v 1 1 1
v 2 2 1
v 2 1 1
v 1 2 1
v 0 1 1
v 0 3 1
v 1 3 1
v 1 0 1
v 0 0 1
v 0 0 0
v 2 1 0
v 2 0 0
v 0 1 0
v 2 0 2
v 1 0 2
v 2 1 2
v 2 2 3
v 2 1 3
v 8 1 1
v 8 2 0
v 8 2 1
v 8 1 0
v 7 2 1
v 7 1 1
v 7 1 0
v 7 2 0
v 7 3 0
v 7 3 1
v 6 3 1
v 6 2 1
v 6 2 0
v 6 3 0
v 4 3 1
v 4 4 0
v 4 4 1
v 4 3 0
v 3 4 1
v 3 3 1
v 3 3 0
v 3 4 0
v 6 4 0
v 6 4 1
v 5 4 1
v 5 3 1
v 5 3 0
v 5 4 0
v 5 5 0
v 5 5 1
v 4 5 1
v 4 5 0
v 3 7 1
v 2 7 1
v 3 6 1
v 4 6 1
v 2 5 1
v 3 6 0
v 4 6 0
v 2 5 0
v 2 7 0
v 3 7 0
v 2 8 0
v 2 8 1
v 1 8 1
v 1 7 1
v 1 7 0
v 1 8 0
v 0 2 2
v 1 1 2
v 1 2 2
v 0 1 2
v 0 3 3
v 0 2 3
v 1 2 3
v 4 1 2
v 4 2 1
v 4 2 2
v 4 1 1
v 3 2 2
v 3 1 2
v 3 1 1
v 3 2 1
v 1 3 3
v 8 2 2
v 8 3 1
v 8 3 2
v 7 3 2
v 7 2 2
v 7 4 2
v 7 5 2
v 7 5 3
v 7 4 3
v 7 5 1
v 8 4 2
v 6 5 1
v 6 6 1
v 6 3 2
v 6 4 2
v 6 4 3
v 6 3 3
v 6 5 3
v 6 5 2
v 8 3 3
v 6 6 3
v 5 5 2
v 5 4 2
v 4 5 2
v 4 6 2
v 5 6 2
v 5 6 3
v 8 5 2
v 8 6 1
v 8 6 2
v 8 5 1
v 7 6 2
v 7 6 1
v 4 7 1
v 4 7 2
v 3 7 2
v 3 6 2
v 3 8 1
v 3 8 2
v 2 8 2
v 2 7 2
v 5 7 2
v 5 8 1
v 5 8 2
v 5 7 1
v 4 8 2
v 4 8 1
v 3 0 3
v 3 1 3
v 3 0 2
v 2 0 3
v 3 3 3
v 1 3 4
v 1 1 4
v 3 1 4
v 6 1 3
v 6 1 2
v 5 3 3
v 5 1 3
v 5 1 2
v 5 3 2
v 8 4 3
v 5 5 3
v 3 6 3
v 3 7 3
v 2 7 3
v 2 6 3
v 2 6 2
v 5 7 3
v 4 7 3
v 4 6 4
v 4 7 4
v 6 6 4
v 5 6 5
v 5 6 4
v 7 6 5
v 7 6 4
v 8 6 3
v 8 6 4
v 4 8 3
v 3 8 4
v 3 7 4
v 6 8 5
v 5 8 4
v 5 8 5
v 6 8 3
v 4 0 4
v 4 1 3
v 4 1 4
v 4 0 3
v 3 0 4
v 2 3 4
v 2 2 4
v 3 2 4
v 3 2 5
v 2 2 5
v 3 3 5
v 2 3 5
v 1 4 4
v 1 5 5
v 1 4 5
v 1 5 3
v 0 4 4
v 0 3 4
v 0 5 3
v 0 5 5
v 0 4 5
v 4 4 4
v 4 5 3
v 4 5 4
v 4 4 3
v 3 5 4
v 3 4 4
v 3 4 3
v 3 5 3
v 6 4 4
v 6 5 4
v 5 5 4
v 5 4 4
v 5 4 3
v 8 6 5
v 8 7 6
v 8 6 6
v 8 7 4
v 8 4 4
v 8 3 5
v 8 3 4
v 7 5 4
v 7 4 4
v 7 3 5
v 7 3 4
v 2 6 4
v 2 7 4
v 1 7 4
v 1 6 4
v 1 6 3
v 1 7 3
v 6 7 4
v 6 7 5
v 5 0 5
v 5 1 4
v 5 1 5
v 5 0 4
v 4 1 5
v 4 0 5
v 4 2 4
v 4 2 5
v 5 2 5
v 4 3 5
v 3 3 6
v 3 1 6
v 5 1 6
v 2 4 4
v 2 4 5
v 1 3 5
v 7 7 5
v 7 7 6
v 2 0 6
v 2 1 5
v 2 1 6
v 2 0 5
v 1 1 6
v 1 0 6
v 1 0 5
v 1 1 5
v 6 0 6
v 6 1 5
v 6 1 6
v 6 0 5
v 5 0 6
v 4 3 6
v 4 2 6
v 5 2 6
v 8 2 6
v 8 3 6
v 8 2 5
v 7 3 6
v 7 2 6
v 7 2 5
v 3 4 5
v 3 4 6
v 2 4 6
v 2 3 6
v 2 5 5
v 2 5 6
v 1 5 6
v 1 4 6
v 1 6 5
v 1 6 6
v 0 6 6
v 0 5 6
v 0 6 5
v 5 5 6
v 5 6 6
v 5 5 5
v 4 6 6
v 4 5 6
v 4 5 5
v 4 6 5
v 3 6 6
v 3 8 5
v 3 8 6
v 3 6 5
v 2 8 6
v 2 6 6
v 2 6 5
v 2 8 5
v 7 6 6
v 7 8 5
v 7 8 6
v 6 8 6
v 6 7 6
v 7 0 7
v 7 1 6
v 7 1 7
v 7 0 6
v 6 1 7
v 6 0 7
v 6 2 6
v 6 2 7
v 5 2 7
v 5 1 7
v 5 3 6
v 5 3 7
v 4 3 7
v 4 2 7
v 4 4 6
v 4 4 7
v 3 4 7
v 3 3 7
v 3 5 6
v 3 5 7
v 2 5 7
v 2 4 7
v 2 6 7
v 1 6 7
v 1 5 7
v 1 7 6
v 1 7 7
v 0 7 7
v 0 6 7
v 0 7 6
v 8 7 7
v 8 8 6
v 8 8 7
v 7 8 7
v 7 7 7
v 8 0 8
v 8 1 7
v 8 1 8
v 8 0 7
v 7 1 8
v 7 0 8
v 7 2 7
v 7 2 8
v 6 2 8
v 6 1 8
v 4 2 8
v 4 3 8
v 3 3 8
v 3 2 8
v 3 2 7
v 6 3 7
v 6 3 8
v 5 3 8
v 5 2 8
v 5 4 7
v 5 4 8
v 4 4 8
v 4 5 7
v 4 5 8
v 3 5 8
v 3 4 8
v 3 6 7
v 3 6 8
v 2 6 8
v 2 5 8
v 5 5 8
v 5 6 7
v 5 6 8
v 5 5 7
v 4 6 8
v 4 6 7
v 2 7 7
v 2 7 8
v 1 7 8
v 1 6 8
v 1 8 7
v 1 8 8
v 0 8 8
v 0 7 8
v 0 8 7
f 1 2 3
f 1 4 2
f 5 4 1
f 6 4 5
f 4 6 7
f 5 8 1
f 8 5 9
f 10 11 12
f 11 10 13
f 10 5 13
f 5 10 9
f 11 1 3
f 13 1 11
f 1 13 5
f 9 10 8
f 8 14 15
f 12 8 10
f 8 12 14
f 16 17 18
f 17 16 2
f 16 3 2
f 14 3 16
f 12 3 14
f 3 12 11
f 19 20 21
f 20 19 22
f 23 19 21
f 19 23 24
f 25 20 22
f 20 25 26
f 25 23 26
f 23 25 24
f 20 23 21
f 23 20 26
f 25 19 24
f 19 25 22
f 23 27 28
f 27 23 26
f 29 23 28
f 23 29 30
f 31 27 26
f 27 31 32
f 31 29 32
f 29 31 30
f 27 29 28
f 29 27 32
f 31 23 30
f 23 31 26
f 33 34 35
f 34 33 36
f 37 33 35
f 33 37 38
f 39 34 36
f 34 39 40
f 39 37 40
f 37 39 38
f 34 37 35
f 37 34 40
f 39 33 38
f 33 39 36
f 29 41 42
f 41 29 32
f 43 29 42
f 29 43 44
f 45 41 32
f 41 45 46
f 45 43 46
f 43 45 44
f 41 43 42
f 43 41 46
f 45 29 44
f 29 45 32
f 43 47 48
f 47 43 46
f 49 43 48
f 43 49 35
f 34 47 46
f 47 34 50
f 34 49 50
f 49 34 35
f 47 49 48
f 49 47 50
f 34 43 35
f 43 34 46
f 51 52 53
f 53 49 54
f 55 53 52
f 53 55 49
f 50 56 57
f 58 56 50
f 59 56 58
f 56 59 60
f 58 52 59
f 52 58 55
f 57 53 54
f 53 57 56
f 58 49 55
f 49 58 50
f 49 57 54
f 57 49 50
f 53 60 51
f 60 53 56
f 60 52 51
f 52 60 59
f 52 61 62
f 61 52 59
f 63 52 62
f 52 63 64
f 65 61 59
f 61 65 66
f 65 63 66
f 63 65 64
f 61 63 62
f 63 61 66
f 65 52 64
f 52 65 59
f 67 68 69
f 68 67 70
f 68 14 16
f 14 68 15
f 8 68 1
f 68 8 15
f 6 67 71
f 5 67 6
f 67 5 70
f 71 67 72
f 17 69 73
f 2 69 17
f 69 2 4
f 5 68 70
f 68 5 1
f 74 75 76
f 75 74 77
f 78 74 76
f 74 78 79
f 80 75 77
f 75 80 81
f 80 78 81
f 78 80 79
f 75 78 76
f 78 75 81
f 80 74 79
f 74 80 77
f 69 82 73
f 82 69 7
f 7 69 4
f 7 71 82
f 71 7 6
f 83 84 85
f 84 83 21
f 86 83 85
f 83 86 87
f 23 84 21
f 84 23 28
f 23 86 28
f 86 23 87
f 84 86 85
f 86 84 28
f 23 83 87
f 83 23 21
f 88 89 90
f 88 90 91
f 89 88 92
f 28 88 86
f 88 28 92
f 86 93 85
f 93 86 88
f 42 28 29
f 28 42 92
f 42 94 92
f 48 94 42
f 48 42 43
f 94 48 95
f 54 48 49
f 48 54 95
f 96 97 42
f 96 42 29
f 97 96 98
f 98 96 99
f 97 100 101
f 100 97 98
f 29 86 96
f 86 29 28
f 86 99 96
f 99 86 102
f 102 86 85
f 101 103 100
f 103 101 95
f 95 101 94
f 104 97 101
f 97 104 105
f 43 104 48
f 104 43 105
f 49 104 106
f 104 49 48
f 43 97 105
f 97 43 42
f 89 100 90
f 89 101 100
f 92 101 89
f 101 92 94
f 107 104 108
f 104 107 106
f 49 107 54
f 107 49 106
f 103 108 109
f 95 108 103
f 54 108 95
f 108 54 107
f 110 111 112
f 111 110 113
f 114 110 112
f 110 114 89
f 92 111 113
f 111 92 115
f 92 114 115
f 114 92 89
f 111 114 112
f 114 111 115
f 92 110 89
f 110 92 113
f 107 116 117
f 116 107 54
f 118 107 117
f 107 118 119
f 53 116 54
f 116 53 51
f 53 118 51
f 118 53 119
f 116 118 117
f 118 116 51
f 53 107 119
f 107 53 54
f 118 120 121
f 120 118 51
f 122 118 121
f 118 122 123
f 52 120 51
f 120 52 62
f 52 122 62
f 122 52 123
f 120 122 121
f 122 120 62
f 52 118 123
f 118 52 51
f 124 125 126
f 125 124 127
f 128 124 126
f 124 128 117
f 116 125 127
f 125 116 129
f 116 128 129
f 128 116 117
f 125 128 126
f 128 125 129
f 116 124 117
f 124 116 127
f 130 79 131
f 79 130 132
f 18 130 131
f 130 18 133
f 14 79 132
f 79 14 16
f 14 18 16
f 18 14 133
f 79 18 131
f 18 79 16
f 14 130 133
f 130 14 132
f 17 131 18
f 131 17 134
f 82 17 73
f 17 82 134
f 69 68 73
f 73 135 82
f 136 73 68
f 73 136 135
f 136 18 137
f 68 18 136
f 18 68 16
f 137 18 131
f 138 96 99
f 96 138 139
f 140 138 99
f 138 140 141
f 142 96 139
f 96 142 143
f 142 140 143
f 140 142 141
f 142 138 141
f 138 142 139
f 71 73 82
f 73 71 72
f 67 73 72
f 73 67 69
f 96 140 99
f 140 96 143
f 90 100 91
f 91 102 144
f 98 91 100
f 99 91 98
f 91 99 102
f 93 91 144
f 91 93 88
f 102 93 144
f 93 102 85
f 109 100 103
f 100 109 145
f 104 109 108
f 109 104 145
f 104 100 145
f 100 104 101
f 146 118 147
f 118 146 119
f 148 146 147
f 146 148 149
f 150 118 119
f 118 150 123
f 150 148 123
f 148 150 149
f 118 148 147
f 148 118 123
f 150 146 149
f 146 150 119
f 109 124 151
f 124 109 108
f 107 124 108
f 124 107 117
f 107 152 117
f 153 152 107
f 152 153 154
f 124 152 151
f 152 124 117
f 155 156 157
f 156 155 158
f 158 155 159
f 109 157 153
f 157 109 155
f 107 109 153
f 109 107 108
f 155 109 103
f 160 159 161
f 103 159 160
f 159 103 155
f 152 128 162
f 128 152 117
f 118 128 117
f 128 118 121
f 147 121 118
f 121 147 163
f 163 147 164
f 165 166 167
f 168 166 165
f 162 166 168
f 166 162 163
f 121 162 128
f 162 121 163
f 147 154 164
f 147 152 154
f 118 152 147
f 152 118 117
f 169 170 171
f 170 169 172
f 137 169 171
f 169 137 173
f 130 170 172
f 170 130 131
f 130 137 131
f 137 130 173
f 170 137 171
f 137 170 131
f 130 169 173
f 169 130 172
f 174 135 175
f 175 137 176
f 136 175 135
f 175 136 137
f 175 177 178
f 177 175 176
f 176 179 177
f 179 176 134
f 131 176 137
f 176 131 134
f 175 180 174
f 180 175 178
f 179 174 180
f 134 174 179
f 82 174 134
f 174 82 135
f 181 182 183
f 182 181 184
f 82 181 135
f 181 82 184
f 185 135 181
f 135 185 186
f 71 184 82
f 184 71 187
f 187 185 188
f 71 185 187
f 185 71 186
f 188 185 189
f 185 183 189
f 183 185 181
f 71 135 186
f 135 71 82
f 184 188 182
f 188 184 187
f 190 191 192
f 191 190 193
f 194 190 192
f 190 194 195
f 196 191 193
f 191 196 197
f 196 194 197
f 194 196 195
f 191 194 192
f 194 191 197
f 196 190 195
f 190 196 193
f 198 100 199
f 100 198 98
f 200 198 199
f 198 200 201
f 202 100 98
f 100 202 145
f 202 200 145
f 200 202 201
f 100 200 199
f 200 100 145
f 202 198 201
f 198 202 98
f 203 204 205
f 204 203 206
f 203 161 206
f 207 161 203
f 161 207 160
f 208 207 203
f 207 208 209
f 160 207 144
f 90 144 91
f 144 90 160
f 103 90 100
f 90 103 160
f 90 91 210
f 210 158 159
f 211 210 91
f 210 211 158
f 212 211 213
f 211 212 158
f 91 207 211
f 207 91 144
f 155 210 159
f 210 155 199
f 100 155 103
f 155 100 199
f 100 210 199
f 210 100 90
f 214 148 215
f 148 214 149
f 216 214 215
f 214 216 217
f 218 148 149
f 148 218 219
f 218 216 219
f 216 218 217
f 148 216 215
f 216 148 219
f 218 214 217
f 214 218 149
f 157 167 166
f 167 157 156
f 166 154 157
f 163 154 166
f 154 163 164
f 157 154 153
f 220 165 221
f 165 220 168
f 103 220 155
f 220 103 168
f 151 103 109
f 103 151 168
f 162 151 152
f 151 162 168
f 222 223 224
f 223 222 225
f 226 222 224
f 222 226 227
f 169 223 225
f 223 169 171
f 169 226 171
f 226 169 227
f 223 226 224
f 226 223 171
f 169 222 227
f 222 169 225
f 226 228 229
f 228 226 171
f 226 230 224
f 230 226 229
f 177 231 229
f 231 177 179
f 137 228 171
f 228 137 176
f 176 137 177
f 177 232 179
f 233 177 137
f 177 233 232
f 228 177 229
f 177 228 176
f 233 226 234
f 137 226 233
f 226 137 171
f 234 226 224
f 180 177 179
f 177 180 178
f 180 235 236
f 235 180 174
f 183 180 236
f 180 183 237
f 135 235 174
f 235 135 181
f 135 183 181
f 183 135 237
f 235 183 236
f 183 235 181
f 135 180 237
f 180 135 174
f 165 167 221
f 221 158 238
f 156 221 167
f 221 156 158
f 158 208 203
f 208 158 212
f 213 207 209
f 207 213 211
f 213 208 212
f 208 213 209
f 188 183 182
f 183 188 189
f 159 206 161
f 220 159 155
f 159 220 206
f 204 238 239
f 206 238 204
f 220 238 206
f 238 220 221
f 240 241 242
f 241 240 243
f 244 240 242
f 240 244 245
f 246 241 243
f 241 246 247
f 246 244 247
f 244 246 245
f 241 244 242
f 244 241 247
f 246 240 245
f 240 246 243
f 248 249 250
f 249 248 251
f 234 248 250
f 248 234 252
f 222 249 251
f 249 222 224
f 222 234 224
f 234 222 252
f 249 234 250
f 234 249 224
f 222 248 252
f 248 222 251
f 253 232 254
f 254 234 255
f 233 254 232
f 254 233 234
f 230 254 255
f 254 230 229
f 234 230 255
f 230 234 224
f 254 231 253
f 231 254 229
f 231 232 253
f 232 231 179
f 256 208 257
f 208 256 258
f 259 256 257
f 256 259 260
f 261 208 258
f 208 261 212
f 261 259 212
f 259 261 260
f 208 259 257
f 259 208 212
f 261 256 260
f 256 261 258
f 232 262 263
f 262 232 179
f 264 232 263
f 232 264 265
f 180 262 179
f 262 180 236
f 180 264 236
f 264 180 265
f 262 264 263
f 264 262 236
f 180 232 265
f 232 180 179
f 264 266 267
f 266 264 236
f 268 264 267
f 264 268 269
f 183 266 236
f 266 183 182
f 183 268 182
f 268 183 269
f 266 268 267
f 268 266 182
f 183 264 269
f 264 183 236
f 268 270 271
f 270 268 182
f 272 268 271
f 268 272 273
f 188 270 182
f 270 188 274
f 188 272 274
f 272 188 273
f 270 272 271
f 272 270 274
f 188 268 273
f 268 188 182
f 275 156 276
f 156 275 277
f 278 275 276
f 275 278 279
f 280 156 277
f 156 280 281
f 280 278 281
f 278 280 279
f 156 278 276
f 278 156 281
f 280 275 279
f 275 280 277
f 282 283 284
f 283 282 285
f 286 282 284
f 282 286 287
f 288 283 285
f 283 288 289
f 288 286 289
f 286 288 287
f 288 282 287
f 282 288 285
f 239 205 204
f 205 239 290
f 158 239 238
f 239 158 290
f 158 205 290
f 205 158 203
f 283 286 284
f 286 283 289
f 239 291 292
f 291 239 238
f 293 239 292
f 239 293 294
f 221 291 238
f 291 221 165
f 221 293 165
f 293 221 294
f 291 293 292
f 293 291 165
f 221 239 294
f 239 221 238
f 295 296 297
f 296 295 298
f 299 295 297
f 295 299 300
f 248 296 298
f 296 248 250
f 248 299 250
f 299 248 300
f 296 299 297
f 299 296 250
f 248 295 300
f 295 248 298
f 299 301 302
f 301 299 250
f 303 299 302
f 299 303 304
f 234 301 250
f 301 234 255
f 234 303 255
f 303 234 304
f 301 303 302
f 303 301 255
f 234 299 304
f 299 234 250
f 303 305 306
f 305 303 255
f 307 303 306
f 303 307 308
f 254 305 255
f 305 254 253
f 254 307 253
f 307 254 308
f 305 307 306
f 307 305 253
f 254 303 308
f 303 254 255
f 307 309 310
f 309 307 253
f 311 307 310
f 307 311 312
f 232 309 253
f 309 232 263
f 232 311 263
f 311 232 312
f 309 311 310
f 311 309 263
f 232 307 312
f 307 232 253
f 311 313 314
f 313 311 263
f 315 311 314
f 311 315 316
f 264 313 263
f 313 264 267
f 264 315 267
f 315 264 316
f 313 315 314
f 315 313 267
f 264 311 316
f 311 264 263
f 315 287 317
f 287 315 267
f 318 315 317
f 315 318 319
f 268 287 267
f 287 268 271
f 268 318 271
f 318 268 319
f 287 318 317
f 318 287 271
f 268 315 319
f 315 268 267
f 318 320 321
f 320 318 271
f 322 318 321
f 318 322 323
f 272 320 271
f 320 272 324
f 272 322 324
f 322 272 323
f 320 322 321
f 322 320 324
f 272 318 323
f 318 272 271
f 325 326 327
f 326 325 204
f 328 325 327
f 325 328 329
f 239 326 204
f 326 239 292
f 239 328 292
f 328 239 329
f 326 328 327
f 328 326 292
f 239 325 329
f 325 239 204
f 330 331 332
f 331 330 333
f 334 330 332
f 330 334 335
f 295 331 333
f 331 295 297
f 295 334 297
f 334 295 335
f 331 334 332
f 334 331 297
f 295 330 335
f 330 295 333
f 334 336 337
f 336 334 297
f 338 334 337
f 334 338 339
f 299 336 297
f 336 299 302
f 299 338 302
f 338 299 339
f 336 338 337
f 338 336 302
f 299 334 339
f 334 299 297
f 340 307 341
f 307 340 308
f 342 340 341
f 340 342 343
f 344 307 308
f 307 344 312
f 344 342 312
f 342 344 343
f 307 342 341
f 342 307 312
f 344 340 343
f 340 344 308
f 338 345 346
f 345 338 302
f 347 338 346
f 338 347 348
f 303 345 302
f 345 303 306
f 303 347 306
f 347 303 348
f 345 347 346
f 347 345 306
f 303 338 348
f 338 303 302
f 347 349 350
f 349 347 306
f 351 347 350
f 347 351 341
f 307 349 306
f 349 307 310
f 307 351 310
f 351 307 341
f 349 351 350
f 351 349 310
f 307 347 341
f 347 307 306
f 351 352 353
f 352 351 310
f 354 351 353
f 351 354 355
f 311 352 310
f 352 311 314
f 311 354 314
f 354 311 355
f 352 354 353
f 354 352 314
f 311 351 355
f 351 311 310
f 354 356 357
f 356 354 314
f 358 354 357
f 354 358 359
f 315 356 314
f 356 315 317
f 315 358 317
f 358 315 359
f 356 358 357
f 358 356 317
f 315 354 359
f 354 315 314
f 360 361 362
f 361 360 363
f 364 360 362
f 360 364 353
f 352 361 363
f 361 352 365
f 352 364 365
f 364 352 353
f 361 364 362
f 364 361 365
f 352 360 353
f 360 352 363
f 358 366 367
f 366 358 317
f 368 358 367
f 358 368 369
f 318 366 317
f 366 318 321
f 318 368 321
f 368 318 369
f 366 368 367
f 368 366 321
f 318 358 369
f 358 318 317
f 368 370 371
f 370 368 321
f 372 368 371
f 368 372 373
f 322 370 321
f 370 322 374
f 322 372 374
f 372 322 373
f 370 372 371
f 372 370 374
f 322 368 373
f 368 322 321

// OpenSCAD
union() {
    translate([0, 0, 0]) cube([1, 1, 1]);
    translate([1, 0, 0]) cube([1, 1, 1]);
    translate([7, 1, 0]) cube([1, 1, 1]);
    translate([6, 2, 0]) cube([1, 1, 1]);
    translate([3, 3, 0]) cube([1, 1, 1]);
    translate([5, 3, 0]) cube([1, 1, 1]);
    translate([4, 4, 0]) cube([1, 1, 1]);
    translate([2, 5, 0]) cube([1, 1, 1]);
    translate([3, 5, 0]) cube([1, 1, 1]);
    translate([2, 6, 0]) cube([1, 1, 1]);
    translate([1, 7, 0]) cube([1, 1, 1]);
    translate([1, 0, 1]) cube([1, 1, 1]);
    translate([0, 1, 1]) cube([1, 1, 1]);
    translate([1, 1, 1]) cube([1, 1, 1]);
    translate([3, 1, 1]) cube([1, 1, 1]);
    translate([0, 2, 1]) cube([1, 1, 1]);
    translate([7, 2, 1]) cube([1, 1, 1]);
    translate([6, 3, 1]) cube([1, 1, 1]);
    translate([5, 4, 1]) cube([1, 1, 1]);
    translate([6, 4, 1]) cube([1, 1, 1]);
    translate([4, 5, 1]) cube([1, 1, 1]);
    translate([5, 5, 1]) cube([1, 1, 1]);
    translate([7, 5, 1]) cube([1, 1, 1]);
    translate([3, 6, 1]) cube([1, 1, 1]);
    translate([2, 7, 1]) cube([1, 1, 1]);
    translate([4, 7, 1]) cube([1, 1, 1]);
    translate([2, 0, 2]) cube([1, 1, 1]);
    translate([1, 1, 2]) cube([1, 1, 1]);
    translate([5, 1, 2]) cube([1, 1, 1]);
    translate([0, 2, 2]) cube([1, 1, 1]);
    translate([5, 2, 2]) cube([1, 1, 1]);
    translate([6, 3, 2]) cube([1, 1, 1]);
    translate([7, 3, 2]) cube([1, 1, 1]);
    translate([6, 4, 2]) cube([1, 1, 1]);
    translate([5, 5, 2]) cube([1, 1, 1]);
    translate([2, 6, 2]) cube([1, 1, 1]);
    translate([4, 6, 2]) cube([1, 1, 1]);
    translate([3, 7, 2]) cube([1, 1, 1]);
    translate([3, 0, 3]) cube([1, 1, 1]);
    translate([1, 1, 3]) cube([1, 1, 1]);
    translate([2, 1, 3]) cube([1, 1, 1]);
    translate([1, 2, 3]) cube([1, 1, 1]);
    translate([2, 2, 3]) cube([1, 1, 1]);
    translate([0, 3, 3]) cube([1, 1, 1]);
    translate([0, 4, 3]) cube([1, 1, 1]);
    translate([3, 4, 3]) cube([1, 1, 1]);
    translate([5, 4, 3]) cube([1, 1, 1]);
    translate([7, 4, 3]) cube([1, 1, 1]);
    translate([6, 5, 3]) cube([1, 1, 1]);
    translate([7, 5, 3]) cube([1, 1, 1]);
    translate([1, 6, 3]) cube([1, 1, 1]);
    translate([4, 6, 3]) cube([1, 1, 1]);
    translate([5, 6, 3]) cube([1, 1, 1]);
    translate([3, 7, 3]) cube([1, 1, 1]);
    translate([4, 7, 3]) cube([1, 1, 1]);
    translate([5, 7, 3]) cube([1, 1, 1]);
    translate([4, 0, 4]) cube([1, 1, 1]);
    translate([3, 1, 4]) cube([1, 1, 1]);
    translate([2, 2, 4]) cube([1, 1, 1]);
    translate([1, 3, 4]) cube([1, 1, 1]);
    translate([7, 3, 4]) cube([1, 1, 1]);
    translate([0, 4, 4]) cube([1, 1, 1]);
    translate([7, 4, 4]) cube([1, 1, 1]);
    translate([7, 5, 4]) cube([1, 1, 1]);
    translate([5, 6, 4]) cube([1, 1, 1]);
    translate([6, 6, 4]) cube([1, 1, 1]);
    translate([7, 6, 4]) cube([1, 1, 1]);
    translate([5, 7, 4]) cube([1, 1, 1]);
    translate([1, 0, 5]) cube([1, 1, 1]);
    translate([5, 0, 5]) cube([1, 1, 1]);
    translate([3, 1, 5]) cube([1, 1, 1]);
    translate([4, 1, 5]) cube([1, 1, 1]);
    translate([3, 2, 5]) cube([1, 1, 1]);
    translate([7, 2, 5]) cube([1, 1, 1]);
    translate([2, 3, 5]) cube([1, 1, 1]);
    translate([1, 4, 5]) cube([1, 1, 1]);
    translate([0, 5, 5]) cube([1, 1, 1]);
    translate([4, 5, 5]) cube([1, 1, 1]);
    translate([2, 6, 5]) cube([1, 1, 1]);
    translate([7, 6, 5]) cube([1, 1, 1]);
    translate([2, 7, 5]) cube([1, 1, 1]);
    translate([6, 7, 5]) cube([1, 1, 1]);
    translate([6, 0, 6]) cube([1, 1, 1]);
    translate([5, 1, 6]) cube([1, 1, 1]);
    translate([4, 2, 6]) cube([1, 1, 1]);
    translate([3, 3, 6]) cube([1, 1, 1]);
    translate([2, 4, 6]) cube([1, 1, 1]);
    translate([1, 5, 6]) cube([1, 1, 1]);
    translate([0, 6, 6]) cube([1, 1, 1]);
    translate([7, 7, 6]) cube([1, 1, 1]);
    translate([7, 0, 7]) cube([1, 1, 1]);
    translate([6, 1, 7]) cube([1, 1, 1]);
    translate([3, 2, 7]) cube([1, 1, 1]);
    translate([5, 2, 7]) cube([1, 1, 1]);
    translate([4, 3, 7]) cube([1, 1, 1]);
    translate([3, 4, 7]) cube([1, 1, 1]);
    translate([2, 5, 7]) cube([1, 1, 1]);
    translate([4, 5, 7]) cube([1, 1, 1]);
    translate([1, 6, 7]) cube([1, 1, 1]);
    translate([0, 7, 7]) cube([1, 1, 1]);
}
